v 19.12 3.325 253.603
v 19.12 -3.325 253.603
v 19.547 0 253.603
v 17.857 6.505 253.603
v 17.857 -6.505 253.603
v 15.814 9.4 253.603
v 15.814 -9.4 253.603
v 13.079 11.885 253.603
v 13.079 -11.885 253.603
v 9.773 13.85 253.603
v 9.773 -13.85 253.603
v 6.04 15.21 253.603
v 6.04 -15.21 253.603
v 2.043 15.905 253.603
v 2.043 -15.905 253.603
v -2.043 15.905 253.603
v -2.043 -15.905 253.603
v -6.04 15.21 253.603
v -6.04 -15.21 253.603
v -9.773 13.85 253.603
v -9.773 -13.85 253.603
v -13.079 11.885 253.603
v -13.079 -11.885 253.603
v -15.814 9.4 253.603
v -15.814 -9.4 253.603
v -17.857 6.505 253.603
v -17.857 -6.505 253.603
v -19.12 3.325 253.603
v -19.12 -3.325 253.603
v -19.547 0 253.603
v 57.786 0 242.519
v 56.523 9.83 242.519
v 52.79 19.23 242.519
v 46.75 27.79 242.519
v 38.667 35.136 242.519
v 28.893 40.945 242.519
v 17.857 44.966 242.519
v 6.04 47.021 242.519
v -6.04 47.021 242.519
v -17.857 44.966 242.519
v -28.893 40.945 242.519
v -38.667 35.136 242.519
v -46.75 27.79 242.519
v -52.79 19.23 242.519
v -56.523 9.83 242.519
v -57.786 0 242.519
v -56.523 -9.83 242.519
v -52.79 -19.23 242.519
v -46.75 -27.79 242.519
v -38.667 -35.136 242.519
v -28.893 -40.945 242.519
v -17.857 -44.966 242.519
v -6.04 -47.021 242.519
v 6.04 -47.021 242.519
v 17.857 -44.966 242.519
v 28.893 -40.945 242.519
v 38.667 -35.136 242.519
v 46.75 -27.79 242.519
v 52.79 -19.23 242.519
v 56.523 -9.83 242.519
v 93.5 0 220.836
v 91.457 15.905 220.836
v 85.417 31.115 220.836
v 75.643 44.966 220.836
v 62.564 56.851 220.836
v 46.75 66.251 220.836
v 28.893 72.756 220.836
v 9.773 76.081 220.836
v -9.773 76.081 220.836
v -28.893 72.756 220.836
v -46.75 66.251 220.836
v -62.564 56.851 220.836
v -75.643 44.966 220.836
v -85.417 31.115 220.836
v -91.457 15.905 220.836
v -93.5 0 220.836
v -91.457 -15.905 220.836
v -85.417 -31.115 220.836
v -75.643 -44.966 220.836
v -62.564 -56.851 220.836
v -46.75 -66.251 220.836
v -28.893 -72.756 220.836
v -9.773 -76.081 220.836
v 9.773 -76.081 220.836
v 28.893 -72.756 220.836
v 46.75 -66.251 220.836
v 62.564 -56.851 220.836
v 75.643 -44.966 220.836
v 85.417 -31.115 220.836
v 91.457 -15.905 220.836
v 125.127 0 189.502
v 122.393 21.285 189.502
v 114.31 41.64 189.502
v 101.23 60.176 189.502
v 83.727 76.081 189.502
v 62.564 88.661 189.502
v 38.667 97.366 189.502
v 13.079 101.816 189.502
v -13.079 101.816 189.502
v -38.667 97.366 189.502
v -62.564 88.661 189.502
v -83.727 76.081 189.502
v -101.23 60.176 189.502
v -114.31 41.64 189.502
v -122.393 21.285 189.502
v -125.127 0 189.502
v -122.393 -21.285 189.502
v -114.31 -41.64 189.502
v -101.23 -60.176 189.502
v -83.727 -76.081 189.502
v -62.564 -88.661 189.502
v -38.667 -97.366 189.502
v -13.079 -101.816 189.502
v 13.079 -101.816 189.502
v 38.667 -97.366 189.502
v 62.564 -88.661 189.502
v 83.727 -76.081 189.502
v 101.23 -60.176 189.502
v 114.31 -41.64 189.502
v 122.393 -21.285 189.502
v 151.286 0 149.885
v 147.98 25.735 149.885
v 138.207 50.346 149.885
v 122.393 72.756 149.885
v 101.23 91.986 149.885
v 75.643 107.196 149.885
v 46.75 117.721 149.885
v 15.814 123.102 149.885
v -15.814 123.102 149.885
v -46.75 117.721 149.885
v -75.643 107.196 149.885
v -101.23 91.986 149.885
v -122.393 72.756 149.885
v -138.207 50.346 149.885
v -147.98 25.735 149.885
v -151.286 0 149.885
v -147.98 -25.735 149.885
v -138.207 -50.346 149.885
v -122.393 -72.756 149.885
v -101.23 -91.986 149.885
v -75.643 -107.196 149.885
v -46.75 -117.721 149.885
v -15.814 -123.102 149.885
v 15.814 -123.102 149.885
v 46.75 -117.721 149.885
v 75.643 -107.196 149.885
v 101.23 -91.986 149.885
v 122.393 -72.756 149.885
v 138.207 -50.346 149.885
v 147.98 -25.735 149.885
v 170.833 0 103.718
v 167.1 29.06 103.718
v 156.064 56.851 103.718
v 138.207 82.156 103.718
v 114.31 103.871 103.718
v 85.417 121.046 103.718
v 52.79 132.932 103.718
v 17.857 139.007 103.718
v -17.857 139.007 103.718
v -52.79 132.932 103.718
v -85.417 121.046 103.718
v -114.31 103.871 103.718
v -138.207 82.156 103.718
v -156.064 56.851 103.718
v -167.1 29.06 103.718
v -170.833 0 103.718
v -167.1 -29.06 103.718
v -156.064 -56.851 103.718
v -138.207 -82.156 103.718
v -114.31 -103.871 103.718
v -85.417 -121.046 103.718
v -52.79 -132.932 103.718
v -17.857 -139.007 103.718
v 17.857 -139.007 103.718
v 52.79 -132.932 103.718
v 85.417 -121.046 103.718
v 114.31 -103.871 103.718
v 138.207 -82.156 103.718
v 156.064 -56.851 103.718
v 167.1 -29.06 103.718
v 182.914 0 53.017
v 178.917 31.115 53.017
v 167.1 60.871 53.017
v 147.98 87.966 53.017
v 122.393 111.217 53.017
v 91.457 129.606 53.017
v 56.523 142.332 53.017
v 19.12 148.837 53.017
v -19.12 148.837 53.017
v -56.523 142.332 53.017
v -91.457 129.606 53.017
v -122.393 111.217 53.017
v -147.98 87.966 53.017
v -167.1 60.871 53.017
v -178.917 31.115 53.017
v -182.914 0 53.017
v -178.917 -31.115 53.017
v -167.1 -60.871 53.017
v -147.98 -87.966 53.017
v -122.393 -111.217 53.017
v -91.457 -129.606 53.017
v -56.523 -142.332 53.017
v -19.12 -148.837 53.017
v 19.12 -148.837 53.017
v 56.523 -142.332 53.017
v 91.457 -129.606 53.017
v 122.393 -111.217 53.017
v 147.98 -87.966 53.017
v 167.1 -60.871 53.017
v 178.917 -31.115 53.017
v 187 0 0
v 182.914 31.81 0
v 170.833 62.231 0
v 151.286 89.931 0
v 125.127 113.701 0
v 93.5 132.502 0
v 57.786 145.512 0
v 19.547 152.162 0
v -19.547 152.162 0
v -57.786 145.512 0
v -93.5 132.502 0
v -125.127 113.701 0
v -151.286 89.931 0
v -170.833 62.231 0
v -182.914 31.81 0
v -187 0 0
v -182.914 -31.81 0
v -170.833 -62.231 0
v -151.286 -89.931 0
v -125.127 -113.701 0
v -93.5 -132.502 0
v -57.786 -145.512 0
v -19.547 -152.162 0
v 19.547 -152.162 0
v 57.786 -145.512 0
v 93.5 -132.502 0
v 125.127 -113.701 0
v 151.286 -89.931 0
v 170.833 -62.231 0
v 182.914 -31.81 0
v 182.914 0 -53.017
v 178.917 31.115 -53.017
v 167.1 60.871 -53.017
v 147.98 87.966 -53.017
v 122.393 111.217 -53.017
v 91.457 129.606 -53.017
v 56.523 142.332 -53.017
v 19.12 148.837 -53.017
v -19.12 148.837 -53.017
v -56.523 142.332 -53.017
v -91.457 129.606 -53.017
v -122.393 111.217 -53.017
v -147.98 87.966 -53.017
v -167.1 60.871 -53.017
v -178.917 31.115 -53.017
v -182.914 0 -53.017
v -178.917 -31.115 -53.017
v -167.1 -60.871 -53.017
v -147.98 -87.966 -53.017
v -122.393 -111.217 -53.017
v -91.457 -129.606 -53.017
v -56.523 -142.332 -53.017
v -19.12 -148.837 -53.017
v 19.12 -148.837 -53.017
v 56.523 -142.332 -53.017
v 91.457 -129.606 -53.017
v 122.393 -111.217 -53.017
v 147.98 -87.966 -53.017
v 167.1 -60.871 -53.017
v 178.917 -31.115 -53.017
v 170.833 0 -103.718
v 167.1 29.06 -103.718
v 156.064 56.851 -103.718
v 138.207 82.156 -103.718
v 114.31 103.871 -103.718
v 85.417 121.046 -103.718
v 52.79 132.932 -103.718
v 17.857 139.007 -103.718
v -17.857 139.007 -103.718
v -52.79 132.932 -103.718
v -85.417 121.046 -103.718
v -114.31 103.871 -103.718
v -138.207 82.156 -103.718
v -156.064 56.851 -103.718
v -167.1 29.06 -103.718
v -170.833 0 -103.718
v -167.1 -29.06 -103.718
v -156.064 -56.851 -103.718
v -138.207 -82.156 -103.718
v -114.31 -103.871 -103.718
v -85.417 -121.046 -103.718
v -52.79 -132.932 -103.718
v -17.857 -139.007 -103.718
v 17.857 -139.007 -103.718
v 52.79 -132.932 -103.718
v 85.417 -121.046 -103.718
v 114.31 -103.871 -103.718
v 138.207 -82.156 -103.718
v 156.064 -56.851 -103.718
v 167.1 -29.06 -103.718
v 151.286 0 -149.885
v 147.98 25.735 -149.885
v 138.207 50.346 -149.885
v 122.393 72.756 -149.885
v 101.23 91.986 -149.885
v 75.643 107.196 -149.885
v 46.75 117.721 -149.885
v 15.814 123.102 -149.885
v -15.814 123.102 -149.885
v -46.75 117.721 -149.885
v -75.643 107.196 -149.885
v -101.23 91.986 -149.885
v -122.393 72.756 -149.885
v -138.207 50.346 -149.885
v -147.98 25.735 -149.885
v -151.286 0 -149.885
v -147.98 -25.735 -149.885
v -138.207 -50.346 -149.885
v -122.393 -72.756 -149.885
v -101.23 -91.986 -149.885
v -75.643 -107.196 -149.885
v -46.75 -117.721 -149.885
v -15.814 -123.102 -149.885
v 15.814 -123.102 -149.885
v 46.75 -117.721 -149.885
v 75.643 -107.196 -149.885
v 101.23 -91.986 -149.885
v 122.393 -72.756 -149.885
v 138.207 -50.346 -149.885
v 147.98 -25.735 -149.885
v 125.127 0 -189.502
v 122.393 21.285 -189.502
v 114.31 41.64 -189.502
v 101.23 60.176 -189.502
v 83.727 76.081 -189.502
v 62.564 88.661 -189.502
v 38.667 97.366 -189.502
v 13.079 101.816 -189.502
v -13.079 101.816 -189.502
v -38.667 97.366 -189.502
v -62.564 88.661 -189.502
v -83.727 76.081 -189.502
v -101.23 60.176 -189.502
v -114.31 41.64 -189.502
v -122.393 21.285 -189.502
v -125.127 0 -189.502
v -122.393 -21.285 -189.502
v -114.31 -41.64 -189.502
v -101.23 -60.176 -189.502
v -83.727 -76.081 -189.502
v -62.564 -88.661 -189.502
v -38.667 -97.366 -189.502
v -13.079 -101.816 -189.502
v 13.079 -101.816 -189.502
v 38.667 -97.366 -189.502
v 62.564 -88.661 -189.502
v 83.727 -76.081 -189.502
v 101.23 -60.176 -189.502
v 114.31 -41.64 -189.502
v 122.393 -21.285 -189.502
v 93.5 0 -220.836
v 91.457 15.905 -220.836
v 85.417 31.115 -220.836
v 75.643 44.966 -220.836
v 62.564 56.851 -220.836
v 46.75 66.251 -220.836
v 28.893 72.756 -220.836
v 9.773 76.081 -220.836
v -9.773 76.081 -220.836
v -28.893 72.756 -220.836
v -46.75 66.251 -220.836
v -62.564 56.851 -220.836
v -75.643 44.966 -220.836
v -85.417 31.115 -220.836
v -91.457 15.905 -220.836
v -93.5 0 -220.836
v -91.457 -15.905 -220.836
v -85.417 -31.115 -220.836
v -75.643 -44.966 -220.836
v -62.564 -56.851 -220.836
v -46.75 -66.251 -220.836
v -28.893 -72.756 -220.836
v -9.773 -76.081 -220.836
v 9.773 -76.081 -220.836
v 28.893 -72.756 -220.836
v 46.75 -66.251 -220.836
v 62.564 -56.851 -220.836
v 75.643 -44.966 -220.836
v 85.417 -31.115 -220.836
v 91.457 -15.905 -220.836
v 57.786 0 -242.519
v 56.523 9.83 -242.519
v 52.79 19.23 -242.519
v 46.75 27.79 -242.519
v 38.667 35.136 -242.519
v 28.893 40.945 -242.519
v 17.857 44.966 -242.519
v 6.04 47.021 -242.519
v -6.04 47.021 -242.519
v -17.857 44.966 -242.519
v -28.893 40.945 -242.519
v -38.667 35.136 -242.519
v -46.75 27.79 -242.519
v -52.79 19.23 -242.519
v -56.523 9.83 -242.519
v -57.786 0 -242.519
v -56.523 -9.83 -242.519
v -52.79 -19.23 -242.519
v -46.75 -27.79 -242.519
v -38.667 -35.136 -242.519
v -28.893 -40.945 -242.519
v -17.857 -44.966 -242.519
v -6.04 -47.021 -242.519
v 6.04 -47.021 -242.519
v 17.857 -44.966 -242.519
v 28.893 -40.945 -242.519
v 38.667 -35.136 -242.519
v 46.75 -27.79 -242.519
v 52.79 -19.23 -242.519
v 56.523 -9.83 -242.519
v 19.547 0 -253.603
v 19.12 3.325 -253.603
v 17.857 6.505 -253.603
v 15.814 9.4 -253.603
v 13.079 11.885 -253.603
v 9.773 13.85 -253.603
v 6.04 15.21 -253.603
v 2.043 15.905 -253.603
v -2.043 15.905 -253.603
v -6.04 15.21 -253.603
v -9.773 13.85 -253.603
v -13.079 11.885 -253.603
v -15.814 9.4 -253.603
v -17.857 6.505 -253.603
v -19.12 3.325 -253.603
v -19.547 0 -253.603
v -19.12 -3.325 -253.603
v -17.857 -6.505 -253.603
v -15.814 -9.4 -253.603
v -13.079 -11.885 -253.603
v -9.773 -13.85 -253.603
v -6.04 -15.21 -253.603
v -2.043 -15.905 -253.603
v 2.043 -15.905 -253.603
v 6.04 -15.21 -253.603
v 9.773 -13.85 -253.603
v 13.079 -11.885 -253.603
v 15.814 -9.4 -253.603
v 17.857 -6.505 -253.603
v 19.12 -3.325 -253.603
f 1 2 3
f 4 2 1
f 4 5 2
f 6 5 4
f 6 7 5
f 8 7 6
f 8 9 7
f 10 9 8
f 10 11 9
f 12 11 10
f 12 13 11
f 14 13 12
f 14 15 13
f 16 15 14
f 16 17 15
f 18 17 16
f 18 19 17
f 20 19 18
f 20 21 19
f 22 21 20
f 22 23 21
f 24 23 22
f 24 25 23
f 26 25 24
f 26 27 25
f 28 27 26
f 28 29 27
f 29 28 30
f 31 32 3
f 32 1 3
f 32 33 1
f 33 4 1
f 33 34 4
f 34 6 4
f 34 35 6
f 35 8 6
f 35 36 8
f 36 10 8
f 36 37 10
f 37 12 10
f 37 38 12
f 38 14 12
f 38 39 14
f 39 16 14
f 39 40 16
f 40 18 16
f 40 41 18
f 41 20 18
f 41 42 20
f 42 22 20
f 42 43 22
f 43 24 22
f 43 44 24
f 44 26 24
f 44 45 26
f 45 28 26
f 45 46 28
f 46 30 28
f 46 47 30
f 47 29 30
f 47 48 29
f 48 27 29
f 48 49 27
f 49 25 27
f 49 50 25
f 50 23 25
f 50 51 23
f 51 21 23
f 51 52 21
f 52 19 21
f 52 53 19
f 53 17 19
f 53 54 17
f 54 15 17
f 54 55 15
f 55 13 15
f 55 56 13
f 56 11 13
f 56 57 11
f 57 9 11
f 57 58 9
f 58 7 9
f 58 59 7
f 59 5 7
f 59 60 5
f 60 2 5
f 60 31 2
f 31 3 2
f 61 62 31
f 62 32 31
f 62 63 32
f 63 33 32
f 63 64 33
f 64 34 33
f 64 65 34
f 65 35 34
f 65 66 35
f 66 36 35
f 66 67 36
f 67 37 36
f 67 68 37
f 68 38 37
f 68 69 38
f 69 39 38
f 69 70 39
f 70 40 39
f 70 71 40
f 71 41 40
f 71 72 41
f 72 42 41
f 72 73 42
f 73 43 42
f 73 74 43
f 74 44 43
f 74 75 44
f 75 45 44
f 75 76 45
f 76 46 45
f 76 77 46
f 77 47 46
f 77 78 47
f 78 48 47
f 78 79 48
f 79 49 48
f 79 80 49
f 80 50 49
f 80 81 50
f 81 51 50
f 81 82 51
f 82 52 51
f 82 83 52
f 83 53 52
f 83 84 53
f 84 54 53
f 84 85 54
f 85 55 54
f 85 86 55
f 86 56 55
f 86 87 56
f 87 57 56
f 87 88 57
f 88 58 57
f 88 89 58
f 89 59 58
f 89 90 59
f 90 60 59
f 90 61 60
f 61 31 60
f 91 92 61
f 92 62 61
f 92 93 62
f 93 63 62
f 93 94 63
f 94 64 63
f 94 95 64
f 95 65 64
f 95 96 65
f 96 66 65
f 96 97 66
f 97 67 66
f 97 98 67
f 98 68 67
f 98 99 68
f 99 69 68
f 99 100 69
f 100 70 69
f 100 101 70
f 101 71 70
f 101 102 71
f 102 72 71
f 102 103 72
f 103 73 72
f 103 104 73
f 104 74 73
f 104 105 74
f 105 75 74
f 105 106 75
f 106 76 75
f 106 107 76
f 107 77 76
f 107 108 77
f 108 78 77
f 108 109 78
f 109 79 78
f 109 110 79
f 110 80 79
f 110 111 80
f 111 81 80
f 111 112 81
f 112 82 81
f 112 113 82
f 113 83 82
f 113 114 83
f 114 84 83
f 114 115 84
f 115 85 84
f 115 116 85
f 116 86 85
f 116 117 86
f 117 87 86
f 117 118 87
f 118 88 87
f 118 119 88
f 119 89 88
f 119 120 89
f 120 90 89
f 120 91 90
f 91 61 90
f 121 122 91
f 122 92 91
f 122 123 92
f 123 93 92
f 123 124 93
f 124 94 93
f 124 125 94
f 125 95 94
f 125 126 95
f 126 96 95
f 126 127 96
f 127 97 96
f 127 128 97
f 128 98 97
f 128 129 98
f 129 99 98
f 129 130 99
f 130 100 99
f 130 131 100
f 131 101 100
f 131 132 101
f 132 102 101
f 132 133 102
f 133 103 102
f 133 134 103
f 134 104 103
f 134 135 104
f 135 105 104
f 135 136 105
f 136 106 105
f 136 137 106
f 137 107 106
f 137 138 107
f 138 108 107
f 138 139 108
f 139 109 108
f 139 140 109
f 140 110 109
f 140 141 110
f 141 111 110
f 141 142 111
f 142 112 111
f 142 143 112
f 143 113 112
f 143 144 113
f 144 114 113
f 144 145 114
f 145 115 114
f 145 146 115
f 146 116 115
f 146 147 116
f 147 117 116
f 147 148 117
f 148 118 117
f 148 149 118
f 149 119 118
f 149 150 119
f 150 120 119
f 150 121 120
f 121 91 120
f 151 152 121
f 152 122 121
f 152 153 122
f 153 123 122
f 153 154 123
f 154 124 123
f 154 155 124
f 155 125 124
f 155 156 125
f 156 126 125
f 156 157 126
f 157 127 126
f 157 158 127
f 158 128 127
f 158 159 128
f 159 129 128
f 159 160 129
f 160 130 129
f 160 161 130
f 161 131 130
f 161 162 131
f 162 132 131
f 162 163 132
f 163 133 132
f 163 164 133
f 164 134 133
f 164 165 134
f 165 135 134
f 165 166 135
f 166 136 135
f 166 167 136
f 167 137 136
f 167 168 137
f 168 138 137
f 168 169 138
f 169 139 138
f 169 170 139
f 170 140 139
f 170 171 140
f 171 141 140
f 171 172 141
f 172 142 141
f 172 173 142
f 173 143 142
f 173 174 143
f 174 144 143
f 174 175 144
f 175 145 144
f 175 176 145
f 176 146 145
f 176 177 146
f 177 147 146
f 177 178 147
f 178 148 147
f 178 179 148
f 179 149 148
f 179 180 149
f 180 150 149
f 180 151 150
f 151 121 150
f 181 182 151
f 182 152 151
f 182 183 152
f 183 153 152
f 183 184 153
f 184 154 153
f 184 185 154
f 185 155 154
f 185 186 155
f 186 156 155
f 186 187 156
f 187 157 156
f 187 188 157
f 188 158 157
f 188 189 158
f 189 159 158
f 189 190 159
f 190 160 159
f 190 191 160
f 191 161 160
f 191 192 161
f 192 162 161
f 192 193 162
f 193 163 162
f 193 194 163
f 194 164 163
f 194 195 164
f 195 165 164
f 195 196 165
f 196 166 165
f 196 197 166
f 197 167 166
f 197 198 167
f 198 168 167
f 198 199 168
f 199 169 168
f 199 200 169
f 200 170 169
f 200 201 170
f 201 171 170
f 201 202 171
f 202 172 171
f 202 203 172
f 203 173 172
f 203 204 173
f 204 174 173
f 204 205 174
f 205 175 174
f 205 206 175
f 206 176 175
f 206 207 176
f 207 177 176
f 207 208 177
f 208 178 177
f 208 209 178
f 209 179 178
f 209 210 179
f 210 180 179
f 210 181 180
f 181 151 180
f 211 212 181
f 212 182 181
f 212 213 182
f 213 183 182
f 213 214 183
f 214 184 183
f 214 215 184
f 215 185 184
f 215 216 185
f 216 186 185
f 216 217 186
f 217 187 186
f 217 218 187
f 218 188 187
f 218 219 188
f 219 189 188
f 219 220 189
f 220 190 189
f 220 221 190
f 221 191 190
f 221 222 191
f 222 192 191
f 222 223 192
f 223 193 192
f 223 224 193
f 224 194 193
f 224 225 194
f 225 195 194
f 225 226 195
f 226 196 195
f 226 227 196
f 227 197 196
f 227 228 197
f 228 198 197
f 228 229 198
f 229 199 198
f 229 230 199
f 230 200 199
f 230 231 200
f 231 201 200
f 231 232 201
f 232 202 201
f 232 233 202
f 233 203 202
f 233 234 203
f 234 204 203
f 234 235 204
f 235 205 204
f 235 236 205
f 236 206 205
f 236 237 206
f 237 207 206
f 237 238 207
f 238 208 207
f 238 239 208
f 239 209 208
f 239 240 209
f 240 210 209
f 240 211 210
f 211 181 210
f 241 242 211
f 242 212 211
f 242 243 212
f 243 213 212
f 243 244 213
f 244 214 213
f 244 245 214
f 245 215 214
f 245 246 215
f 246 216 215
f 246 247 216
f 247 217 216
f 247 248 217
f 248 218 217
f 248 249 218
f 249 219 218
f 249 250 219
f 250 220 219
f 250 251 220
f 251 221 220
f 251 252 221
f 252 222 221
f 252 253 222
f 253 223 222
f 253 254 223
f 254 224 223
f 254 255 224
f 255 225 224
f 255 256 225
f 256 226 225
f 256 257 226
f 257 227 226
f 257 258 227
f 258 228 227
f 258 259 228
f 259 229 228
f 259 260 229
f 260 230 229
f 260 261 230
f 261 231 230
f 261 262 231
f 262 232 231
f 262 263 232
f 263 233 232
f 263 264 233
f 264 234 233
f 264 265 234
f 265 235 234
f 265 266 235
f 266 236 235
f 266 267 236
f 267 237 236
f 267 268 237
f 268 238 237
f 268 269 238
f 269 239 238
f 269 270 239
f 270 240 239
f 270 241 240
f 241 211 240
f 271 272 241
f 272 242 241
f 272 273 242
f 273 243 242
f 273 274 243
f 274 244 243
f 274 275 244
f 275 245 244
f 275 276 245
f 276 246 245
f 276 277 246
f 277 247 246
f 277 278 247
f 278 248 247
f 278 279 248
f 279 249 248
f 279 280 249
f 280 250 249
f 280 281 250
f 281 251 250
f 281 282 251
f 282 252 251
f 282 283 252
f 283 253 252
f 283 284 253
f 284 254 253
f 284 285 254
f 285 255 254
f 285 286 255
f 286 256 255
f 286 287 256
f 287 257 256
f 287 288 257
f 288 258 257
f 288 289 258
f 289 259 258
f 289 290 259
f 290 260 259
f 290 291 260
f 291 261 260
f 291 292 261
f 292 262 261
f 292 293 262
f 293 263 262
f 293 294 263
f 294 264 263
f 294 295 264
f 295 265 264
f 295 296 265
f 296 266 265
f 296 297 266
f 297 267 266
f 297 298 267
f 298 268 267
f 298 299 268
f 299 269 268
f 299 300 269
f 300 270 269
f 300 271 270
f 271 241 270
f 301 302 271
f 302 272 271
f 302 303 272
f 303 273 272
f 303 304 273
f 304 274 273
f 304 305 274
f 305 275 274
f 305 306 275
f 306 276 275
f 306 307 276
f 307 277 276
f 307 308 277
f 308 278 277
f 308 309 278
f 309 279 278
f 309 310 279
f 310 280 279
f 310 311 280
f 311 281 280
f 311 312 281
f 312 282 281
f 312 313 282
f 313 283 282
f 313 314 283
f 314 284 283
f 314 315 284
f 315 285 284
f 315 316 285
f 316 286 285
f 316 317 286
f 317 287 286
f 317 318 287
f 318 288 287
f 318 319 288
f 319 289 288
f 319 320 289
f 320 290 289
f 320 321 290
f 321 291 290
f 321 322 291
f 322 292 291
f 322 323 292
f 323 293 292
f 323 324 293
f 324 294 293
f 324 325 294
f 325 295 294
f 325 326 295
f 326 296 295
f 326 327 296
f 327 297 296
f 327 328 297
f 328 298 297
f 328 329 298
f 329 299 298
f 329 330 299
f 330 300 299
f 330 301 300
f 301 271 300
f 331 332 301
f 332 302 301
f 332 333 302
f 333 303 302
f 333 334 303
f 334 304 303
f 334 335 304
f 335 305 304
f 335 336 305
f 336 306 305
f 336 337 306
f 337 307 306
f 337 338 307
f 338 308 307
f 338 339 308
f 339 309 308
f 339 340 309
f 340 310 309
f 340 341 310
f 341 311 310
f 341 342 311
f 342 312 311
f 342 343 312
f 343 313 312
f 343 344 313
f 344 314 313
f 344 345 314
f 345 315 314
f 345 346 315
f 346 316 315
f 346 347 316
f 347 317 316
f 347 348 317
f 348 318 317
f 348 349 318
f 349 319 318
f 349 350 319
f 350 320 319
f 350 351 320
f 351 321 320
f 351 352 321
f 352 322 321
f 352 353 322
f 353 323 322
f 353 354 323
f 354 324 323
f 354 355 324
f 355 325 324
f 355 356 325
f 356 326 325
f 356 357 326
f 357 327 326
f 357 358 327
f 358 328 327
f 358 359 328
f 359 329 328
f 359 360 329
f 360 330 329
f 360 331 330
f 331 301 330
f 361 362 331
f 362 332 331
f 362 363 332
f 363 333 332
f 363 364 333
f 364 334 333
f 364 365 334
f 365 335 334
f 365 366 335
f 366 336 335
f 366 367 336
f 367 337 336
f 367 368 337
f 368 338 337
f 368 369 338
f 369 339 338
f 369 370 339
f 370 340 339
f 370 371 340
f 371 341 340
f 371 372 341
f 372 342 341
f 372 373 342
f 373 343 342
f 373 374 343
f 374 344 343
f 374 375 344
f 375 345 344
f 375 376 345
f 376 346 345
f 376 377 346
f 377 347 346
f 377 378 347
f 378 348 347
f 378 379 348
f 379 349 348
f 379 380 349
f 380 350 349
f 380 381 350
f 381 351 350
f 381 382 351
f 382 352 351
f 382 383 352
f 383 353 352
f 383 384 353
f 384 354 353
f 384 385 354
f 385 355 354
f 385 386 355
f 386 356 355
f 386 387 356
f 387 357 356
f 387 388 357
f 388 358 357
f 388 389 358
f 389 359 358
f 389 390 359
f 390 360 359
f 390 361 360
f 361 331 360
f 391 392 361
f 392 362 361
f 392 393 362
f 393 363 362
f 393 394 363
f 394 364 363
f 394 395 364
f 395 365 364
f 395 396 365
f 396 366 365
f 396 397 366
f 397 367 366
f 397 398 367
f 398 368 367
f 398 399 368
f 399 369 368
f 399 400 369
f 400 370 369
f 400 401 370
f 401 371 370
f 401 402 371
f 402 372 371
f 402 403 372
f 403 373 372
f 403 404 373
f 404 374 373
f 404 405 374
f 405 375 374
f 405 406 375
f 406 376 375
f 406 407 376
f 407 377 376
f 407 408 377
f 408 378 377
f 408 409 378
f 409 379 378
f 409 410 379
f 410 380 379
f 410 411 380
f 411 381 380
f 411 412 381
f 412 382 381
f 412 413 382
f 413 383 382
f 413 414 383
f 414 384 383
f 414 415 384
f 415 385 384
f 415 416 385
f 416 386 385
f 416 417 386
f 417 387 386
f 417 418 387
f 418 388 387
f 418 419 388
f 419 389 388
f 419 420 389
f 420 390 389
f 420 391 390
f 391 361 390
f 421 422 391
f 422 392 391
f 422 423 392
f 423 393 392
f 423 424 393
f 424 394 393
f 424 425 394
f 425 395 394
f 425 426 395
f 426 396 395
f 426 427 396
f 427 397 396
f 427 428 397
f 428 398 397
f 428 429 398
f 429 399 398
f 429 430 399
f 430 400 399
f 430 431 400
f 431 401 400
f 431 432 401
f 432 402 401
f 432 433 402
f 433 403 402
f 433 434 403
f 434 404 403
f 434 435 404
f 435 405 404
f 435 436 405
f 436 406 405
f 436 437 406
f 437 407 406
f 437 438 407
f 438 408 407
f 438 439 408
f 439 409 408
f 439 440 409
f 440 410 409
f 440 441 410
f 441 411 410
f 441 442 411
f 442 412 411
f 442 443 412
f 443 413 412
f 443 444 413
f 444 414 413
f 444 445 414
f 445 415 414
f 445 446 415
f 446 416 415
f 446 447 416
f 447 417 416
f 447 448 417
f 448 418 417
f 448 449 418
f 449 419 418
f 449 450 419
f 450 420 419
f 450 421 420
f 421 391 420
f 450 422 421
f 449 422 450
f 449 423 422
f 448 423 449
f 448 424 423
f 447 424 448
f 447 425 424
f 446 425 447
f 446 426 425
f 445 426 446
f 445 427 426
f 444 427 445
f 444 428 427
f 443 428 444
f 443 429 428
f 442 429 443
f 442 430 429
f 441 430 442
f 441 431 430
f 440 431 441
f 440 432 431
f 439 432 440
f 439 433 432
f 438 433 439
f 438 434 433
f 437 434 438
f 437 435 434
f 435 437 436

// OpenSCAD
// Generated by SolidPython 1.0.1 on 2020-07-29 00:46:49


scale(v = [11, 9, 15]) {
	sphere(r = 17);
}
/***********************************************
*********      SolidPython code:      **********
************************************************
 
# import packages: SolidPython
from solid import *
from solid.utils import *
from itertools import chain, combinations, permutations


class Resize:

    def __init__(self, scad_file):
        self.scad_file = scad_file
        #self.scad_file = import_scad(scad_file)
        # cone/cylinder param:
        self.r1 = 0
        self.r2 = 0
        self.h = 0
        # rectangular prism param:
        self.w = 0
        self.l = 0
        # ellipse param:
        self.r = 0

    # import OpenScad code (file name corresponds to shape)


    # classify shape + parameters
    def assign(self, param1, param2, param3):
        if self.scad_file == 'cone.scad':
            self.r1 = param1
            self.r2 = param2
            self.h = param3
        elif self.scad_file == 'cylinder.scad':
            self.r1 = param1
            self.r2 = param2
            self.h = param3
        elif self.scad_file == 'rectangularPrism.scad':
            self.h = param1
            self.l = param2
            self.w = param3
        else:
            self.r = param1
            self.h = param2

    # resize parameters
    def iterate(self):
        x = range(3, 20, 2)
        i = 1
        if self.scad_file == 'cone.scad':
            tempList = list(permutations(x, 2))
            for temp in tempList:
                param1 = temp[0]
                param2 = temp[1]
                filepath = 'produced_scad_files/' + 'cone' + str(param1) + '_' + str(param2) + '_' + '.scad'
                scad_render_to_file(cylinder(h=param1, r1=param2, r2=0), filepath)

        elif self.scad_file == 'cylinder.scad':
            tempList = list(permutations(x, 3))
            for temp in tempList:
                param1 = temp[0]
                param2 = temp[1]
                filepath = 'produced_scad_files/' + 'cylinder' + str(param1) + '_' + str(param2) + '_' + '.scad'
                scad_render_to_file(cylinder(h=param1, r1=param2, r2=param2), filepath)

        elif self.scad_file == 'rectangularPrism.scad':
            tempList = list(permutations(x, 3))
            for temp in tempList:
                param1 = temp[0]
                param2 = temp[1]
                param3 = temp[2]
                filepath = 'produced_scad_files/' + 'rectangularPrism' + str(param1) + '_' + str(param2) + '_' + str(
                    param3) + '.scad'
                scad_render_to_file(cube(size=(param1, param2, param3)), filepath)

        elif self.scad_file == 'ellipse.scad':
            tempList = list(permutations(x, 4))
            for temp in tempList:
                param1 = temp[0]
                param2 = temp[1]
                param3 = temp[2]
                param4 = temp[3]
                filepath = 'produced_scad_files/' + 'ellipse' + str(param1) + '_' + str(param2) + '_' + str(param3) + '_' + str(param4) + '.scad'
                scad_render_to_file(scale([param1, param2, param3])(sphere(r=param4)), filepath)

    def render_to_scadfile(self):
        scad_render_to_file(scad, 'example.scad') 
 
************************************************/
